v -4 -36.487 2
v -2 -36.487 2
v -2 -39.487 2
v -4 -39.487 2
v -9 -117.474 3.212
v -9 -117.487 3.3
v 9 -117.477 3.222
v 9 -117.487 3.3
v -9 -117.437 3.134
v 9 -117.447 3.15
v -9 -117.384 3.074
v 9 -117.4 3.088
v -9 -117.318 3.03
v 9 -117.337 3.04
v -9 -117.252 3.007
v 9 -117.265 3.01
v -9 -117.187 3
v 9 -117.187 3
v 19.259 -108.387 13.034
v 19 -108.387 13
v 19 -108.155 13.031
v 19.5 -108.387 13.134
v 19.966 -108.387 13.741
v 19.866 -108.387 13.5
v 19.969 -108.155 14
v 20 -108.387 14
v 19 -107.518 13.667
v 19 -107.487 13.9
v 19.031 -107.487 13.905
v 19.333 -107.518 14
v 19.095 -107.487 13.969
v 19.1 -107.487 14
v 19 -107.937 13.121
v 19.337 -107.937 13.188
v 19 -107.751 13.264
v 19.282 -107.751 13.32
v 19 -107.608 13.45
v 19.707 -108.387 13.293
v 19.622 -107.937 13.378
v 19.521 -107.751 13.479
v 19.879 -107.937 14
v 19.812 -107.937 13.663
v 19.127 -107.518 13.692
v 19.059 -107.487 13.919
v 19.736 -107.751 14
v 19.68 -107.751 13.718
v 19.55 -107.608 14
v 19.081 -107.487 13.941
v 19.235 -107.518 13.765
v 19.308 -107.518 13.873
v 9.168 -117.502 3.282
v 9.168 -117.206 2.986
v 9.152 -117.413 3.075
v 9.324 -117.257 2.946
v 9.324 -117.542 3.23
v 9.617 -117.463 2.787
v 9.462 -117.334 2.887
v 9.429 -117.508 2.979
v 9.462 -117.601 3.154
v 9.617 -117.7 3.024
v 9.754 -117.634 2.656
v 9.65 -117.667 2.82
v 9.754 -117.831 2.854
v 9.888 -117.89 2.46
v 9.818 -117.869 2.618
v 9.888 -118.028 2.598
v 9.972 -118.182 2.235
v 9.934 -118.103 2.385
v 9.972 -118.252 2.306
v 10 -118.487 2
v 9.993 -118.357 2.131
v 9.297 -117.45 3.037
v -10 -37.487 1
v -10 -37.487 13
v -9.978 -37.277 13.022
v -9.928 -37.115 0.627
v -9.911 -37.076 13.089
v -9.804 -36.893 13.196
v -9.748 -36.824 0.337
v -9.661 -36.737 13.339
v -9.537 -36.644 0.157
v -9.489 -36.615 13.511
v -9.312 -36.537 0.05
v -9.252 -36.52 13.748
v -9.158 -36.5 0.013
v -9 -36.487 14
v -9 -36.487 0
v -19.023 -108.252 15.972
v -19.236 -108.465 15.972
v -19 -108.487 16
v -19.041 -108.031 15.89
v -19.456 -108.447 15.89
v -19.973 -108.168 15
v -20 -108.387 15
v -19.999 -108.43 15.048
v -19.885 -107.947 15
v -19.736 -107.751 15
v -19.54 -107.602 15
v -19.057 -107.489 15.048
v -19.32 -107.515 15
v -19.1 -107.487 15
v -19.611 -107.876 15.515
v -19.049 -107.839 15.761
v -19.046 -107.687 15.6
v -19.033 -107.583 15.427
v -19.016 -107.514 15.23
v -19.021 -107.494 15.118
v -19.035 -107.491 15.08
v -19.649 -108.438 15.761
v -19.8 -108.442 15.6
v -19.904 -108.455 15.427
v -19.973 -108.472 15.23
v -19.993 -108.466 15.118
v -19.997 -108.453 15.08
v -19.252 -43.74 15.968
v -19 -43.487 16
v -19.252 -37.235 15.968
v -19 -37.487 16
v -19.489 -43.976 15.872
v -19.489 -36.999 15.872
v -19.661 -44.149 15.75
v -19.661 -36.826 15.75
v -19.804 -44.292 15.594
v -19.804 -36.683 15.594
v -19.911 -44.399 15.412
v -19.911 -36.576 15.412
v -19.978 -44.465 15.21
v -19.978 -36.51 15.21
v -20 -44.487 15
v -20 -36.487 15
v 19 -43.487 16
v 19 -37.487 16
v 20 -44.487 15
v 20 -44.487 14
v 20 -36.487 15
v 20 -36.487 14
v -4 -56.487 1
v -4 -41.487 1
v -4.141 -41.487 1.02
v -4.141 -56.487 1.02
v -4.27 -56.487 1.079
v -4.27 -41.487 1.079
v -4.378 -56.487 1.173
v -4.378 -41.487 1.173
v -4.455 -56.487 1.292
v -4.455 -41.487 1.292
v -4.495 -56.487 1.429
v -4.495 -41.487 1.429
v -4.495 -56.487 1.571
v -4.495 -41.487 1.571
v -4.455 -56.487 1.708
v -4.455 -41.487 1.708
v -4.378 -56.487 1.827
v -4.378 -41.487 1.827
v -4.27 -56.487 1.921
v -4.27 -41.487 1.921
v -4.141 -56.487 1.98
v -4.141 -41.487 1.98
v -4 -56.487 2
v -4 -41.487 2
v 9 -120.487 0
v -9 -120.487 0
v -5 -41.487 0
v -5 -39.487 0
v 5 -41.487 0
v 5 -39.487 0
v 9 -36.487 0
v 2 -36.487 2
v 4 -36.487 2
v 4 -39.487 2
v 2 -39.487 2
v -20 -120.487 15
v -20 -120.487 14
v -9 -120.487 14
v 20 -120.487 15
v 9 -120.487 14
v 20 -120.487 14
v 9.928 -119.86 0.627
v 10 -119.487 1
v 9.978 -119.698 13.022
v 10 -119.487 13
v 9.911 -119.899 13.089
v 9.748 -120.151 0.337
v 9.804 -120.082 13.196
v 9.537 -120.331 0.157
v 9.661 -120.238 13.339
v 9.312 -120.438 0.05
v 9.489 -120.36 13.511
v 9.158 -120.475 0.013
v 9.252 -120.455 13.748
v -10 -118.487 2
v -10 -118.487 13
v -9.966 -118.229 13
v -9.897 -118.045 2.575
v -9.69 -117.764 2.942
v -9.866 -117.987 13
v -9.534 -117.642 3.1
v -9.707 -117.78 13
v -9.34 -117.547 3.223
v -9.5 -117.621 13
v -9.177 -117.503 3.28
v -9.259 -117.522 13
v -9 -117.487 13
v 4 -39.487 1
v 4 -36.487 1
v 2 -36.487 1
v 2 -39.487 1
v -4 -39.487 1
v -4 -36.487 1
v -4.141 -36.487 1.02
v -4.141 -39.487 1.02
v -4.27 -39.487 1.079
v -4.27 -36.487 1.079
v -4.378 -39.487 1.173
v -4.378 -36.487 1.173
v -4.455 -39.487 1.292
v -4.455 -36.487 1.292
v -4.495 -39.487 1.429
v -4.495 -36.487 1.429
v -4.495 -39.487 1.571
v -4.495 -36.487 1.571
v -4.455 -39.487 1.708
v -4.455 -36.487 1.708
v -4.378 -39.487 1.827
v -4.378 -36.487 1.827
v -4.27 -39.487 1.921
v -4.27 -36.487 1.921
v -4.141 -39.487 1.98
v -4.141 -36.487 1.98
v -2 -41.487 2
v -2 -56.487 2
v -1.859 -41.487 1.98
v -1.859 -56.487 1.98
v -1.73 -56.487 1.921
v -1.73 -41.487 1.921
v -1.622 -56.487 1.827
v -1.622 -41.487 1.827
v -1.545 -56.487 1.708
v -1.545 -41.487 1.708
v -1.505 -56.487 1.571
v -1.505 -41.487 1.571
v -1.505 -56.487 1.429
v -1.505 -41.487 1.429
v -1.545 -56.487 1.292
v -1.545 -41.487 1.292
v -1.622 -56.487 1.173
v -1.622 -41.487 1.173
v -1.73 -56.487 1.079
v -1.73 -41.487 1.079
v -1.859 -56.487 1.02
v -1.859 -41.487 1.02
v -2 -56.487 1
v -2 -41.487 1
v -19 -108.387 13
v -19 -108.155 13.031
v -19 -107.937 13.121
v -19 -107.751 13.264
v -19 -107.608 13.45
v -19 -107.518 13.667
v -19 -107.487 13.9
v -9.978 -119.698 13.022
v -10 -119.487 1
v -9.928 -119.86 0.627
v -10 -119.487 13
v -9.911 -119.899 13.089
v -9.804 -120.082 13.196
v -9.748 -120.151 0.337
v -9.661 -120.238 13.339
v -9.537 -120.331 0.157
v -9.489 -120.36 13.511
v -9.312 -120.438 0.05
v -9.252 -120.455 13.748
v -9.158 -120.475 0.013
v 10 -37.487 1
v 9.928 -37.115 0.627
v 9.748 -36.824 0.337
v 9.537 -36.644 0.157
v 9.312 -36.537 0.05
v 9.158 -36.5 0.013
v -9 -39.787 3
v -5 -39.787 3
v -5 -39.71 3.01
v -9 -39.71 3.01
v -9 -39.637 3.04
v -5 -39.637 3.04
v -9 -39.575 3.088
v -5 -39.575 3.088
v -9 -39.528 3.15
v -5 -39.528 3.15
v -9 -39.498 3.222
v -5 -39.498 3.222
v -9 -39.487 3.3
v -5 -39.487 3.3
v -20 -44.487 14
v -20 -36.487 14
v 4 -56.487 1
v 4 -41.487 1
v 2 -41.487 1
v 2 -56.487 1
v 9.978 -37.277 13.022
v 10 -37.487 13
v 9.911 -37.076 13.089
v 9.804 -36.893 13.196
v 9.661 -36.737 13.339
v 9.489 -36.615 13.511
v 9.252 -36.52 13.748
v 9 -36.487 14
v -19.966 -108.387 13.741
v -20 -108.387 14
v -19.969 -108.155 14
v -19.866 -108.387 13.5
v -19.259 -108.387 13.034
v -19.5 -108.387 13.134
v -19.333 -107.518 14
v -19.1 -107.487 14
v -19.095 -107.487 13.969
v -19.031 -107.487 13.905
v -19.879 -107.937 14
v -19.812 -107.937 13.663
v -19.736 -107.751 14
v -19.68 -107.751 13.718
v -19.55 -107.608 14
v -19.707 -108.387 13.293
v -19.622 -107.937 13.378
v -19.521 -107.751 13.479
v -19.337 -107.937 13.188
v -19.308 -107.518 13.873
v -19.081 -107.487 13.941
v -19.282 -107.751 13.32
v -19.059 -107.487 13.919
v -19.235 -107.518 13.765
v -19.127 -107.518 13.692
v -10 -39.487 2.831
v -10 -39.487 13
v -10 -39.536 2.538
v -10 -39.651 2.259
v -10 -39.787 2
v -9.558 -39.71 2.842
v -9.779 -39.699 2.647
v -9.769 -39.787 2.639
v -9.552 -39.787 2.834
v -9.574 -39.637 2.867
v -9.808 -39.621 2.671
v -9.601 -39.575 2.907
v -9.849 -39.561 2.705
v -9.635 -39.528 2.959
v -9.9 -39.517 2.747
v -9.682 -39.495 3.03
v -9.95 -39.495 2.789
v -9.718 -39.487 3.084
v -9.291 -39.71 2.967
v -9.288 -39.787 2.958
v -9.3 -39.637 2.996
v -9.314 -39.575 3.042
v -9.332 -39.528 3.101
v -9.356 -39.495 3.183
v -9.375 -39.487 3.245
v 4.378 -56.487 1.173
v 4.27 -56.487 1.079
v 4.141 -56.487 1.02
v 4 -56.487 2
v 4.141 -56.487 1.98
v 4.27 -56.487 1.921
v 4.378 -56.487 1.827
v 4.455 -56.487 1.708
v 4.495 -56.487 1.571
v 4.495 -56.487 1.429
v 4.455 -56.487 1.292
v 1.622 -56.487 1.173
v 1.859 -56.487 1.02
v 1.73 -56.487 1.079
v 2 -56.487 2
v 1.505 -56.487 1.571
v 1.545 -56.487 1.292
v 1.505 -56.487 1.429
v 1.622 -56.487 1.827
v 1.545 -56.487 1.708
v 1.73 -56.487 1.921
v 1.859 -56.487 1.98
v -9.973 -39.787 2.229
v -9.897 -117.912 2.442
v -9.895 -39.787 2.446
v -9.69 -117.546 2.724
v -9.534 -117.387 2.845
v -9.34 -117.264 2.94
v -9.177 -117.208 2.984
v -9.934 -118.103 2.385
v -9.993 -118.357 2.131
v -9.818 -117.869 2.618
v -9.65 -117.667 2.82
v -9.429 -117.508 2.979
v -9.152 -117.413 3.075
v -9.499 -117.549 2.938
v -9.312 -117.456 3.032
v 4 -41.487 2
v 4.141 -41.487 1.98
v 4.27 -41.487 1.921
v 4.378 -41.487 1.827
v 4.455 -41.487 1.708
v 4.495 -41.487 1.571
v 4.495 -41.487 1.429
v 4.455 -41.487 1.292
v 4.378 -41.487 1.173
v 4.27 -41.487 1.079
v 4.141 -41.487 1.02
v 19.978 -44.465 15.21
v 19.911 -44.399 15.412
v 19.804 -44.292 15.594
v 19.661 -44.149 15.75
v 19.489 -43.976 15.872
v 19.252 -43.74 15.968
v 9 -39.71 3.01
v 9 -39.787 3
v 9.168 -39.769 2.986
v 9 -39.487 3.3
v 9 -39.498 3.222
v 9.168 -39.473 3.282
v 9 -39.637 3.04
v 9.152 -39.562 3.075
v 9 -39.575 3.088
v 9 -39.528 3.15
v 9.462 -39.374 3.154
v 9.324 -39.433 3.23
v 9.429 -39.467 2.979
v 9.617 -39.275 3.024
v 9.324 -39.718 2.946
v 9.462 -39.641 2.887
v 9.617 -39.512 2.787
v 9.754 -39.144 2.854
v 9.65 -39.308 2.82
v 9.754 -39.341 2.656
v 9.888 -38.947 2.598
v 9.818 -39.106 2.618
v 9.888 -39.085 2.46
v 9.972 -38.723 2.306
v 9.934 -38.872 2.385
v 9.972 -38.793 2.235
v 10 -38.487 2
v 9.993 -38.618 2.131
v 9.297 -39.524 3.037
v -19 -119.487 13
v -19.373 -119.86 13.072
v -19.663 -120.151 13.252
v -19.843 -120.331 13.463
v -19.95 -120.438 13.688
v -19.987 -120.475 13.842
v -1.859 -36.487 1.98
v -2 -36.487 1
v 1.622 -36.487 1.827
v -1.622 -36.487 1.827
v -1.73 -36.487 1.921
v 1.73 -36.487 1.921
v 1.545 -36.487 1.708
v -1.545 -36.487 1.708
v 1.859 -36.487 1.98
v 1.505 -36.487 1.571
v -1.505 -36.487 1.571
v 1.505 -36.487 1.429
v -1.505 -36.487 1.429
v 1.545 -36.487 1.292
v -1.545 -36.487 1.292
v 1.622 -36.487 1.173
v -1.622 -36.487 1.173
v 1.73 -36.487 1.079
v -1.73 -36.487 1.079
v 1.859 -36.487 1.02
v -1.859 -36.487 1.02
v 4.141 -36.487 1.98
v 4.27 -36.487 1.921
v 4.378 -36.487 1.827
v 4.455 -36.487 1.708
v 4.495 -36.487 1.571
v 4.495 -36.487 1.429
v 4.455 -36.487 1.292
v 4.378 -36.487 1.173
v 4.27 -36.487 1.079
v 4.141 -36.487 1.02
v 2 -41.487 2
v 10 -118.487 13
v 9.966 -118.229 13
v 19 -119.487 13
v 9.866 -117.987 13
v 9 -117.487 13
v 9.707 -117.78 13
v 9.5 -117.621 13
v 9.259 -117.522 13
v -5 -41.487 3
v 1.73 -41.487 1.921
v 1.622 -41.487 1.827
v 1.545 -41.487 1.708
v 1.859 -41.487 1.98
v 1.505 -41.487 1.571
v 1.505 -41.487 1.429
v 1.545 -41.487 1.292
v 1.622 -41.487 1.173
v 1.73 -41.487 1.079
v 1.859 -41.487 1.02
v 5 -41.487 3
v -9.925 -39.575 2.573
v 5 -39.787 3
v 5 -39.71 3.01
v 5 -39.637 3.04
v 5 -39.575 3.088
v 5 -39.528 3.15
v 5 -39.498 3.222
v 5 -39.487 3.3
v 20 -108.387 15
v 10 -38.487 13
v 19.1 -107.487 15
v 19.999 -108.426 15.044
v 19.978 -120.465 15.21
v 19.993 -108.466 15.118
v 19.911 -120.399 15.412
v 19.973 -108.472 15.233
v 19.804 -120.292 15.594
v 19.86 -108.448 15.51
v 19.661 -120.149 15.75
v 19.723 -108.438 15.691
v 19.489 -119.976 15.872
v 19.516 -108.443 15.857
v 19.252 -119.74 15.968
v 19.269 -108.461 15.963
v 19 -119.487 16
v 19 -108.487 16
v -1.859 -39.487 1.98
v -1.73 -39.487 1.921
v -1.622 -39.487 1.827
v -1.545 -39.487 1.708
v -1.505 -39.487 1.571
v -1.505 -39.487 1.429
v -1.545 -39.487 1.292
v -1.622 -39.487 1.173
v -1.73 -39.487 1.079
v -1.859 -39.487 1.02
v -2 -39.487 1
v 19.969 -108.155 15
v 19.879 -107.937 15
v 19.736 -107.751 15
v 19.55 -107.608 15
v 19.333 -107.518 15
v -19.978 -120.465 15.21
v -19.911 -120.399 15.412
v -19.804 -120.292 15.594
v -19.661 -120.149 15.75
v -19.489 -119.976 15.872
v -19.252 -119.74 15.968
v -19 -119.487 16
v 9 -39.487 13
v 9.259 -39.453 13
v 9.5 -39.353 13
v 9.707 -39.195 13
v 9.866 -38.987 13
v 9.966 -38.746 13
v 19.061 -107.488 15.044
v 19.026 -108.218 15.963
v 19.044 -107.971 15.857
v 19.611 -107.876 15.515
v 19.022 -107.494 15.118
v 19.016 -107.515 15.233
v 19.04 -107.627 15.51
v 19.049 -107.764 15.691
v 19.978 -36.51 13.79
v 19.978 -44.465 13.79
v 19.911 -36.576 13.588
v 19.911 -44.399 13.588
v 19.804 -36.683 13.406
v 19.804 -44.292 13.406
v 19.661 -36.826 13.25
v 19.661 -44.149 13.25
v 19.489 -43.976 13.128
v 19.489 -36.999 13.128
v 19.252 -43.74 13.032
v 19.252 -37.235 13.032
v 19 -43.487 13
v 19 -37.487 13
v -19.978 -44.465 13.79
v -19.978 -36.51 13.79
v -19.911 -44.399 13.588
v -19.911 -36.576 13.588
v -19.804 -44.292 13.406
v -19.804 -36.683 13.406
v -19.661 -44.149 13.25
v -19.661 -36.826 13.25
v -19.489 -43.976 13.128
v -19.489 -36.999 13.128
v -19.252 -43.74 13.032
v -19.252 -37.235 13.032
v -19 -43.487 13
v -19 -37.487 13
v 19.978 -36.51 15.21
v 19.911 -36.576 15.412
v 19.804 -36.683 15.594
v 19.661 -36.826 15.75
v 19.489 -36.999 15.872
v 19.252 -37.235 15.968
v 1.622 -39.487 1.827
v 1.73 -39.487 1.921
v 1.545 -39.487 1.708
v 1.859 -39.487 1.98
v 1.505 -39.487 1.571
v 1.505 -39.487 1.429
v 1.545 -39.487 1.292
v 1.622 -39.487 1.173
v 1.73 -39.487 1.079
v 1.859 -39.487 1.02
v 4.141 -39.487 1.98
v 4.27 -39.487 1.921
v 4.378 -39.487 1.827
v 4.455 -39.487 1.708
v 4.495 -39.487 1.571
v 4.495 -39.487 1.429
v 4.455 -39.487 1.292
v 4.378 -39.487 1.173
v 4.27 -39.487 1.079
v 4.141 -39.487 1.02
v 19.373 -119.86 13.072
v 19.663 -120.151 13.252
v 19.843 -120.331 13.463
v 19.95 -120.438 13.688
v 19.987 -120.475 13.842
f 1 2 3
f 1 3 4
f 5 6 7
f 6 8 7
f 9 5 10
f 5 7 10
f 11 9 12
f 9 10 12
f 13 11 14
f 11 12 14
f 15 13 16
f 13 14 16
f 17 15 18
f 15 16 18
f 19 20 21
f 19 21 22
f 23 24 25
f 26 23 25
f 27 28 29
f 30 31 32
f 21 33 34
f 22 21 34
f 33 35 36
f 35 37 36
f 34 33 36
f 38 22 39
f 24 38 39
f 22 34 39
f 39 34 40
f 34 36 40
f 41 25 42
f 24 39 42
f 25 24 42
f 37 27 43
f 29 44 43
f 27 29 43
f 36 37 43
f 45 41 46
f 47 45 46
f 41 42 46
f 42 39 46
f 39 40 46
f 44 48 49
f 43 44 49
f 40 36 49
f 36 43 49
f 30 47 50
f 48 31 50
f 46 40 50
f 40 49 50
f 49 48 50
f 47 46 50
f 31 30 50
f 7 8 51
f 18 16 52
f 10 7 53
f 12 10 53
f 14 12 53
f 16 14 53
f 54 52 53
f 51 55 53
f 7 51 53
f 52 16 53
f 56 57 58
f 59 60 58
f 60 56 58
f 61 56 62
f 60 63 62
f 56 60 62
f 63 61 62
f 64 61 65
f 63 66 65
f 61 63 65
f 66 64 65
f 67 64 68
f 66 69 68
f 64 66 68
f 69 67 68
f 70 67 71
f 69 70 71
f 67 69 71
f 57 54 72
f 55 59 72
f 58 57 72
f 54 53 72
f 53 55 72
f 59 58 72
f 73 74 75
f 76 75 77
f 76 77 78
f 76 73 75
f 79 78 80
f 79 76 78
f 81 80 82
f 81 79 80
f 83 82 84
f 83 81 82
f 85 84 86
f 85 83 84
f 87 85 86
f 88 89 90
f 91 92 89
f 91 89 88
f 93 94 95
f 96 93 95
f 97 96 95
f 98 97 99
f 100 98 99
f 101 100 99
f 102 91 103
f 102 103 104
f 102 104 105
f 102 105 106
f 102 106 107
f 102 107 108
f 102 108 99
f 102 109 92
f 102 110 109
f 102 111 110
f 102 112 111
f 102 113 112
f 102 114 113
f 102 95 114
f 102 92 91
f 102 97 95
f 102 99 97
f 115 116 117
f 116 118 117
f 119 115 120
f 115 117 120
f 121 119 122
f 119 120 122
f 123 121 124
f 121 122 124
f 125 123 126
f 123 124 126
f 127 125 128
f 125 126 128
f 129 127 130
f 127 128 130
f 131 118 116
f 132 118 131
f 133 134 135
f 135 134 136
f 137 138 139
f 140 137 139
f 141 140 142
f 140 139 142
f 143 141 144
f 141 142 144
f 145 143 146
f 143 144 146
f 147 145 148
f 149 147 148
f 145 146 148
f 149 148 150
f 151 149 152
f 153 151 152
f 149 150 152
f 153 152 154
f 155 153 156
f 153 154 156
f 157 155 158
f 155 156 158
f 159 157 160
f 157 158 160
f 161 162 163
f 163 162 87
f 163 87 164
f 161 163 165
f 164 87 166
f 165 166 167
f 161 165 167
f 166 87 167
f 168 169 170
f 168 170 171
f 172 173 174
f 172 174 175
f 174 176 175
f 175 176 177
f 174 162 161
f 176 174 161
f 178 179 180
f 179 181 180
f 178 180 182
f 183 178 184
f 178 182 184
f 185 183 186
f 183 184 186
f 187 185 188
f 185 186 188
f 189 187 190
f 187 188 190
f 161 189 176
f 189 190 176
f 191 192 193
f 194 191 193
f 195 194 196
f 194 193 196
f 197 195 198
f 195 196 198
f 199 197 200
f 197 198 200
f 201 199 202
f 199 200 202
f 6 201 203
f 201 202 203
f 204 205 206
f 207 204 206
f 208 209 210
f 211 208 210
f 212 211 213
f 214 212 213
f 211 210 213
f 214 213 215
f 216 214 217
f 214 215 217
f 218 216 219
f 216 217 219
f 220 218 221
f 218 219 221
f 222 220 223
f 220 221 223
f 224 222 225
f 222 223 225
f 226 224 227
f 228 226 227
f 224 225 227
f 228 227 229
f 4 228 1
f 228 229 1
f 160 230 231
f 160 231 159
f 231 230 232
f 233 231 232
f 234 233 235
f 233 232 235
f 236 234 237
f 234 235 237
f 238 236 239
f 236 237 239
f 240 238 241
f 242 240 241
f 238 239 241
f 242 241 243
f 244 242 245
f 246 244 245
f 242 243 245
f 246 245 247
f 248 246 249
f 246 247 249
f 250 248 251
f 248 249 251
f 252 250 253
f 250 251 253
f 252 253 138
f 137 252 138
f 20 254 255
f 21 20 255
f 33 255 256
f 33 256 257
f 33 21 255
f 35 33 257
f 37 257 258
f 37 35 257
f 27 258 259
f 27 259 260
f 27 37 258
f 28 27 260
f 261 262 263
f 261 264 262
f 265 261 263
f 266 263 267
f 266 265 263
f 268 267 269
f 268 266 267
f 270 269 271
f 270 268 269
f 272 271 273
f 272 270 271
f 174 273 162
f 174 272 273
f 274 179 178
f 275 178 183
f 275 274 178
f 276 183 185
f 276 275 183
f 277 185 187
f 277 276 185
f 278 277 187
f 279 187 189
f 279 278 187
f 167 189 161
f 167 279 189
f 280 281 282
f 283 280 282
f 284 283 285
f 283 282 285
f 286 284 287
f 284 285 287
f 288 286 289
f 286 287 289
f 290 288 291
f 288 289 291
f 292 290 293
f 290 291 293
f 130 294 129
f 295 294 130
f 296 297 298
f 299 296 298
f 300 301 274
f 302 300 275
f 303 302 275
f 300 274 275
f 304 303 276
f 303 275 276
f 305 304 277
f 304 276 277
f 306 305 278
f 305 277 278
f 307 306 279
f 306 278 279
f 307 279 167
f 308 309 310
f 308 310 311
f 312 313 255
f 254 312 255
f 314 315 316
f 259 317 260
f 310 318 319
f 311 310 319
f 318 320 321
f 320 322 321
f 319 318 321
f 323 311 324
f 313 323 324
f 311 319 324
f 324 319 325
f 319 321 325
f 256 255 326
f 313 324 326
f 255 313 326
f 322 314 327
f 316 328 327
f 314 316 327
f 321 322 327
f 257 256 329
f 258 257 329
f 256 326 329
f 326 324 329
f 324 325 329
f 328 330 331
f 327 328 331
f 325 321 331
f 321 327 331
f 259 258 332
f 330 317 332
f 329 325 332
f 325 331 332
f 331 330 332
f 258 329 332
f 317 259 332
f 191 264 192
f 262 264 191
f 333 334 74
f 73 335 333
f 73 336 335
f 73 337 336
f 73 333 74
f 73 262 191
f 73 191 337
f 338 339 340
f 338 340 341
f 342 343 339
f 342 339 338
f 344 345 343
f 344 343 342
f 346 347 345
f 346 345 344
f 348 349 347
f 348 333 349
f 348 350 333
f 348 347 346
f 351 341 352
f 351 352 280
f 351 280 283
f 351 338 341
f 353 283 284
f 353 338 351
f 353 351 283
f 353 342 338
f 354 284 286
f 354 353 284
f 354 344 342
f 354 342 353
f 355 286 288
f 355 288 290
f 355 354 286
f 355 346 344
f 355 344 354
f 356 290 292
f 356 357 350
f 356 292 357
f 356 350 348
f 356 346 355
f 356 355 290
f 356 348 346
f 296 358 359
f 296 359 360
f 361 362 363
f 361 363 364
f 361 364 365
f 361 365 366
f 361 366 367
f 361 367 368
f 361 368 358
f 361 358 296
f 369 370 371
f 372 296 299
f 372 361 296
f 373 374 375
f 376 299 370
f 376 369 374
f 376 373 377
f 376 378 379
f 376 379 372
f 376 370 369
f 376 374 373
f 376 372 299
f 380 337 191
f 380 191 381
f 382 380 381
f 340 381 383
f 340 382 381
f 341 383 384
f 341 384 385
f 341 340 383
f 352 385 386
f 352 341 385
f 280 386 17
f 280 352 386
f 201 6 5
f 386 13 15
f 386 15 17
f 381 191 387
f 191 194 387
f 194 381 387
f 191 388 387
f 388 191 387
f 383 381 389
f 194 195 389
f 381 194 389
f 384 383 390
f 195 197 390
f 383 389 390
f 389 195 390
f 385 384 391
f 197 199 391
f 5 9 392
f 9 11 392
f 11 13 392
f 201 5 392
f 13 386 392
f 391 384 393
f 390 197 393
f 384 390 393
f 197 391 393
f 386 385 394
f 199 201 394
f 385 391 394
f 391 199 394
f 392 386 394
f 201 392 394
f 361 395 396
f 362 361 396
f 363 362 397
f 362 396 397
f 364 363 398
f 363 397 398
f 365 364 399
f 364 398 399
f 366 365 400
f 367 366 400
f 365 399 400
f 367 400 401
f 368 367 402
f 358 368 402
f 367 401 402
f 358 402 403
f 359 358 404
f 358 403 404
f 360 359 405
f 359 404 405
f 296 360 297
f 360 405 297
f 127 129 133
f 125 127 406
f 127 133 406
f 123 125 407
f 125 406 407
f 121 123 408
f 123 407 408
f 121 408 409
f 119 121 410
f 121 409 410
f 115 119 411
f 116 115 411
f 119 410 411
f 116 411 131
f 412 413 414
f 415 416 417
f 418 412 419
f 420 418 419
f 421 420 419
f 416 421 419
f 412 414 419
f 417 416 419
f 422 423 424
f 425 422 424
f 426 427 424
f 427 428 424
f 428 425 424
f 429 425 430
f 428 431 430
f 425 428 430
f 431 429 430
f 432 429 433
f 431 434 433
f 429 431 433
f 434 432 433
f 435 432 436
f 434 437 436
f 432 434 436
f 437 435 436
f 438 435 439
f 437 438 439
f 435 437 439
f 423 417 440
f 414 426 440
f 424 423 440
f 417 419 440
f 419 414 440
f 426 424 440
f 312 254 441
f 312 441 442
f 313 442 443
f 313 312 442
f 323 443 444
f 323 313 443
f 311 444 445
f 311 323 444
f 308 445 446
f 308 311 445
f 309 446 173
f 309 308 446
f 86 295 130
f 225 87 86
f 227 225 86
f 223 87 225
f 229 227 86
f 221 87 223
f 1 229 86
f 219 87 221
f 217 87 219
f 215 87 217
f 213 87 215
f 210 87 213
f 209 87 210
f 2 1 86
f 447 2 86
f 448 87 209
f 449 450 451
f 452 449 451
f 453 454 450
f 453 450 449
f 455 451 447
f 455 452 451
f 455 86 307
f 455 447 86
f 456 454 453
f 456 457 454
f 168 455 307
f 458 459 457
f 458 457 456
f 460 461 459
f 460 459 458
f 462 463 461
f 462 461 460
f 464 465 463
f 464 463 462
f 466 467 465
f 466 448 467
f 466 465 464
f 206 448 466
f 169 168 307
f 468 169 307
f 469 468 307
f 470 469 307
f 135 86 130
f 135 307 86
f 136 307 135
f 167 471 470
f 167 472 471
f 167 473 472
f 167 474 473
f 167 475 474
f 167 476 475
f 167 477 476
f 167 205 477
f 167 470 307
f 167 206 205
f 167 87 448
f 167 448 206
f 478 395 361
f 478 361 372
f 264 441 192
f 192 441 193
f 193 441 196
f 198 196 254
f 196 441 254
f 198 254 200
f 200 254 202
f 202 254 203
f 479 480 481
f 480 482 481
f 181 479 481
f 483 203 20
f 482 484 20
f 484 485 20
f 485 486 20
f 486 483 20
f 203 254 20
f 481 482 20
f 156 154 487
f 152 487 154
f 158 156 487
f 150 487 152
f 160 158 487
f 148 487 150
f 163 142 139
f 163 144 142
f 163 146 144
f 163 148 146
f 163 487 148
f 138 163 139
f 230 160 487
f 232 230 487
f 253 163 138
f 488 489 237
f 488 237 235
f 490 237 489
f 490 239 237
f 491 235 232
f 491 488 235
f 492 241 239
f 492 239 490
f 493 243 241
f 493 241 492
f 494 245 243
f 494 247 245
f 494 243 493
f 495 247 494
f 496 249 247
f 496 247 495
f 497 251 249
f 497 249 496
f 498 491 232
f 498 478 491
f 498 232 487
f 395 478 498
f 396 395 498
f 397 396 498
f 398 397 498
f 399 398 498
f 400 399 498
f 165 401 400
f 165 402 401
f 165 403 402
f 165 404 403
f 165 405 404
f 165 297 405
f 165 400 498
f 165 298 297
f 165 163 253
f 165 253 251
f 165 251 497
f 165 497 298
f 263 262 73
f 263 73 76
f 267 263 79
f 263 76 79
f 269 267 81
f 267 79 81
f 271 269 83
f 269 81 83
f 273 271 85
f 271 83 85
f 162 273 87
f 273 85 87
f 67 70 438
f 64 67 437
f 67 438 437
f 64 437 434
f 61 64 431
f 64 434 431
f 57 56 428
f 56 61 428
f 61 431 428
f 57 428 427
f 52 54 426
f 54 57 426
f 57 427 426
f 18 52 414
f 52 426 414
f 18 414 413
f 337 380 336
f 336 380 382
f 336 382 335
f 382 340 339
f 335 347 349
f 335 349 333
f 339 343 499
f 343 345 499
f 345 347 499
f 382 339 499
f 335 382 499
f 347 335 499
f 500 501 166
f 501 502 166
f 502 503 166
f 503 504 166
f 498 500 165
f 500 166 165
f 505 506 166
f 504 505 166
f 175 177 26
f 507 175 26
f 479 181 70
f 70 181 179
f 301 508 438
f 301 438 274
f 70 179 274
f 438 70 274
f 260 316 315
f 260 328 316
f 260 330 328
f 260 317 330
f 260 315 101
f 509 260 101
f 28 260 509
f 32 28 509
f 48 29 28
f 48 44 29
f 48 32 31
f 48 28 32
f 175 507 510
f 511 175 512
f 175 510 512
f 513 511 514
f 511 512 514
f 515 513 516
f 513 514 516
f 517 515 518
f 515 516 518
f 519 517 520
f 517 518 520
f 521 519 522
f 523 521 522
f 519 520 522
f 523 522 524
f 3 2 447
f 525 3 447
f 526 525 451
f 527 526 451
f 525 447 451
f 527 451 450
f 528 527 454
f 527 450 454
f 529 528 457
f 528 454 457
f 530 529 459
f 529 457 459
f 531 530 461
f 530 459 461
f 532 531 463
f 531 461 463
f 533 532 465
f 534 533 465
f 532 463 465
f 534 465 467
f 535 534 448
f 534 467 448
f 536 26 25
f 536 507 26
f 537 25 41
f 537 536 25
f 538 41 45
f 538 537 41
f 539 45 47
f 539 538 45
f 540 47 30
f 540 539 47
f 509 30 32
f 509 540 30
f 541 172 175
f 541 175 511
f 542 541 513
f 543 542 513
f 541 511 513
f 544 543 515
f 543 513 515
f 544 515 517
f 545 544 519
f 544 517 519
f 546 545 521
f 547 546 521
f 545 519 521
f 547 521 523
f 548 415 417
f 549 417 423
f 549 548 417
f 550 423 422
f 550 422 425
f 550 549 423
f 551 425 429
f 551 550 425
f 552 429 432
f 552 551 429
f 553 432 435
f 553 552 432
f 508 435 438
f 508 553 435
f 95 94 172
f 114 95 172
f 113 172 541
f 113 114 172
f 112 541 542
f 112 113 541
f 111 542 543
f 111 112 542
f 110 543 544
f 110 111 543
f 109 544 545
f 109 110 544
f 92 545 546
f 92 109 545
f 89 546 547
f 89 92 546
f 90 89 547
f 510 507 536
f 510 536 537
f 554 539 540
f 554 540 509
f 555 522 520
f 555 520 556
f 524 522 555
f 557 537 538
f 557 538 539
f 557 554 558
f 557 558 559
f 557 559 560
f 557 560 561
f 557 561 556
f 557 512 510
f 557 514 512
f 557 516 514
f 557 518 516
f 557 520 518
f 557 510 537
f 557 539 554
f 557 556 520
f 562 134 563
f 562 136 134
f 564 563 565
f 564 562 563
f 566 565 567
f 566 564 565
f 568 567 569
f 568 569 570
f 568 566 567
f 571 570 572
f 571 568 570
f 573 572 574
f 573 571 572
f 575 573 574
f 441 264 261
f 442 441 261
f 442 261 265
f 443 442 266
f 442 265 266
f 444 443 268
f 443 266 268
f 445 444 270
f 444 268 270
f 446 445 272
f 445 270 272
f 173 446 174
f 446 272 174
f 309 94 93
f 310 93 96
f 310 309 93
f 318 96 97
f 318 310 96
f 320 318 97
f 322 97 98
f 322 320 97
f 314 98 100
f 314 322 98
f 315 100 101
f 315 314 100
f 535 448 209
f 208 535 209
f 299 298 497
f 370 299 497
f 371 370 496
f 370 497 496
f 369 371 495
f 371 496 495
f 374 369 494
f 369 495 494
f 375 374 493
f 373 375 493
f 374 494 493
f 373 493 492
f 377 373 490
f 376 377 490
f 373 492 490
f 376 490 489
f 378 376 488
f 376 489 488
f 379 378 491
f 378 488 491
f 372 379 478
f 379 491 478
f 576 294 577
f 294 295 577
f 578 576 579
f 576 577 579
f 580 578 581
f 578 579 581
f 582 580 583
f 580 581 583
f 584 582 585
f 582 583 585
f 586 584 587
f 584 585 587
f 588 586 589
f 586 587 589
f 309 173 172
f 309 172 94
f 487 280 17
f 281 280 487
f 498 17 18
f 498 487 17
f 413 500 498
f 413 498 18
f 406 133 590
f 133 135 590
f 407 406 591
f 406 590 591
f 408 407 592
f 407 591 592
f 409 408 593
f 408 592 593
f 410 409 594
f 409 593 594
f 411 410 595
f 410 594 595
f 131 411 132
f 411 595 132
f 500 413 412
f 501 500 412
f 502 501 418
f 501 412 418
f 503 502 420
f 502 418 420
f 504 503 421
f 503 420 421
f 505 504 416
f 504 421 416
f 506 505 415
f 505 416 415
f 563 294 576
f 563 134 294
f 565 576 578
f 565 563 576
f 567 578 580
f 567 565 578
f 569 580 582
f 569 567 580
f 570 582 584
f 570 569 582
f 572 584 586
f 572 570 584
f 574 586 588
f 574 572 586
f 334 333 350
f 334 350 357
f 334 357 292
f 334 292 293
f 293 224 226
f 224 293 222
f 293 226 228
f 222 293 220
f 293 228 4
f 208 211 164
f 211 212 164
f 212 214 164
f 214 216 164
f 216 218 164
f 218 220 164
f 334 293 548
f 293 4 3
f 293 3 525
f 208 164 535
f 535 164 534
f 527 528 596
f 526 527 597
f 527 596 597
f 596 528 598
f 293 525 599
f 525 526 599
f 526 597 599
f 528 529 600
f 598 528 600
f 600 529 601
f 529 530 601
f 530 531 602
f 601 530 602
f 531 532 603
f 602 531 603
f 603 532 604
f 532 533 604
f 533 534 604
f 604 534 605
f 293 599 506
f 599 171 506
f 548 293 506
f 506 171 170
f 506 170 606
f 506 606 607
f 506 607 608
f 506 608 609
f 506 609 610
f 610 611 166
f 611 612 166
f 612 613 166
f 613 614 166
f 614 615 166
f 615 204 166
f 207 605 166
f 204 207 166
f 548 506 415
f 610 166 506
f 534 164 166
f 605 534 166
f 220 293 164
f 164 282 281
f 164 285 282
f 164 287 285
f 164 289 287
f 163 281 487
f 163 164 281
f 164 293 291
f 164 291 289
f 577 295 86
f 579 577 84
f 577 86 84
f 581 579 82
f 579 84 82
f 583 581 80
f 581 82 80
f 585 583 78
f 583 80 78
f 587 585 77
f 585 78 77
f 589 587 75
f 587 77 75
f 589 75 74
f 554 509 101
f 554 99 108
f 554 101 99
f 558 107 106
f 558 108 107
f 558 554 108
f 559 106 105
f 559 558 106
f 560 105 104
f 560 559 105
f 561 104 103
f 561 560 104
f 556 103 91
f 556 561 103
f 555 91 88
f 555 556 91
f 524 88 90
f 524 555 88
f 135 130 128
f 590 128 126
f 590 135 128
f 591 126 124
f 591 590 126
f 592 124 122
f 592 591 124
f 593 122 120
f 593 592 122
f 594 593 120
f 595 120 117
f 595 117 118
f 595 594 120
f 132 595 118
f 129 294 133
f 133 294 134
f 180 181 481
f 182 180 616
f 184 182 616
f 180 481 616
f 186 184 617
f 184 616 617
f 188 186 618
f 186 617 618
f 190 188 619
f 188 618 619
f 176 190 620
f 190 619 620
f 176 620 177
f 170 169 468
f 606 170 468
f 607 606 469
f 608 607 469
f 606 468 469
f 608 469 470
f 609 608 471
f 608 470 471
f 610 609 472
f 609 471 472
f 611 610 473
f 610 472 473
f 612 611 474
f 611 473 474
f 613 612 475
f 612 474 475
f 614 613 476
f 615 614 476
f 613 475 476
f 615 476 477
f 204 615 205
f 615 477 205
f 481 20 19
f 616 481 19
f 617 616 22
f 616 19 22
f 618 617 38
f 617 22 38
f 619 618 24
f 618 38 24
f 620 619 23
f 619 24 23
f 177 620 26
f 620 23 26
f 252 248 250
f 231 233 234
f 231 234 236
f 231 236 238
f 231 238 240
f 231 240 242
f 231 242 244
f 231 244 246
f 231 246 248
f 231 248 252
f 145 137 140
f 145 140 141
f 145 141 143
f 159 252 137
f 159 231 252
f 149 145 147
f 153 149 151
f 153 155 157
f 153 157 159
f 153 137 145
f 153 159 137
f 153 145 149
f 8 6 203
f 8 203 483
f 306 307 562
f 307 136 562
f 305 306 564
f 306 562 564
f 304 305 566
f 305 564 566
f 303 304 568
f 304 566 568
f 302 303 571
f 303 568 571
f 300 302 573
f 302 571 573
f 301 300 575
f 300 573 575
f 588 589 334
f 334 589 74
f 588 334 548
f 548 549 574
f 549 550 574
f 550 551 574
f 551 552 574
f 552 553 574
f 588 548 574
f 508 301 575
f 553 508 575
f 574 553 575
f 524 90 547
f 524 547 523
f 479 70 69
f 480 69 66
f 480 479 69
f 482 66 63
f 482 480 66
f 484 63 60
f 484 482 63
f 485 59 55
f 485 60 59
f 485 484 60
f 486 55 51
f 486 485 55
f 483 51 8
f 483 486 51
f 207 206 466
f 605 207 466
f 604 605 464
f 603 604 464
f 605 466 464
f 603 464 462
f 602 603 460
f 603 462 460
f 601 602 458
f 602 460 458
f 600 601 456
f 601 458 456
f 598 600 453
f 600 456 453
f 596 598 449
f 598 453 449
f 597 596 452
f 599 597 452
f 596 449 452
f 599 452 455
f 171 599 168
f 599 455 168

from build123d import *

# Parameters (mm, degrees)
SKETCH001_W     = 20
SKETCH001_H     = 84
PAD001_DEPTH    = 3
SKETCH002_W     = 20
SKETCH002_H     = 3
PAD002_DEPTH    = 10
SKETCH003_W     = 40
SKETCH003_H     = 8
SKETCH003_H_2   = 13
PAD003_DEPTH    = 3
FILLET_R        = 1
FILLET001_R     = 1
FILLET002_R     = 1
FILLET003_R     = 0.3
FILLET004_R     = 0.9
SKETCH009_W     = 10
SKETCH009_H     = 2
POCKET004_DEPTH = 5
POCKET005_DEPTH = 20


with BuildPart() as part:
    # Sketch001 → Pad001 (new body)
    with BuildSketch(Plane.XY):
        with Locations((0, -78.487457)):
            Rectangle(SKETCH001_W, SKETCH001_H)
    extrude(amount=PAD001_DEPTH)

    # Sketch002 → Pad002 (new body)
    with BuildSketch(Plane.XY.offset(3)):
        with Locations((0, -118.987457)):
            Rectangle(SKETCH002_W, SKETCH002_H)
        with Locations((0, -37.987457)):
            Rectangle(SKETCH002_W, SKETCH002_H)
    extrude(amount=PAD002_DEPTH)

    # Sketch003 → Pad003 (new body)
    with BuildSketch(Plane.XY.offset(13)):
        with Locations((0, -40.487457)):
            Rectangle(SKETCH003_W, SKETCH003_H)
        with Locations((0, -113.987457)):
            Rectangle(SKETCH003_W, SKETCH003_H_2)
    extrude(amount=PAD003_DEPTH)

    # Fillet
    fillet_edges = [part.edges().sort_by_distance(p)[0] for p in [
        (20, -113.987457, 16),
        (20, -113.987457, 13),
        (-20, -113.987457, 16),
        (0, -107.487457, 16),
        (0, -120.487457, 16),
        (-20, -113.987457, 13),
        (-15, -120.487457, 13),
        (15, -120.487457, 13),
    ]]
    fillet(fillet_edges, radius=FILLET_R)

    # Fillet001
    fillet001_edges = [part.edges().sort_by_distance(p)[0] for p in [
        (20, -40.487457, 16),
        (0, -44.487457, 16),
        (0, -36.487457, 16),
        (-20, -40.487457, 16),
        (-20, -40.487457, 13),
        (-15, -36.487457, 13),
        (15, -36.487457, 13),
        (20, -40.487457, 13),
        (0, -44.487457, 13),
    ]]
    fillet(fillet001_edges, radius=FILLET001_R)

    # Fillet002
    fillet002_edges = [part.edges().sort_by_distance(p)[0] for p in [
        (-10, -78.487457, 3),
        (-10, -117.487457, 8),
        (-10, -120.487457, 6.5),
        (-10, -78.487457, 0),
        (-10, -36.487457, 6.5),
        (10, -39.487457, 8),
        (10, -36.487457, 6.5),
        (10, -78.487457, 0),
        (10, -78.487457, 3),
        (10, -117.487457, 8),
        (10, -120.487457, 6.5),
    ]]
    fillet(fillet002_edges, radius=FILLET002_R)

    # Fillet003
    fillet003_edges = [part.edges().sort_by_distance(p)[0] for p in [
        (0, -39.487457, 3),
        (0, -117.487457, 3),
    ]]
    fillet(fillet003_edges, radius=FILLET003_R)

    # Fillet004
    fillet004_edges = [part.edges().sort_by_distance(p)[0] for p in [
        (0, -107.487457, 13),
    ]]
    fillet(fillet004_edges, radius=FILLET004_R)

    # Sketch009 → Pocket004 (cut)
    with BuildSketch(Plane(origin=(0, 0, 0), x_dir=(1, 0, 0), z_dir=(0, 0, -1))):
        with Locations((0, 40.487457)):
            Rectangle(SKETCH009_W, SKETCH009_H)
    extrude(amount=-POCKET004_DEPTH, mode=Mode.SUBTRACT)

    # Sketch012 → Pocket005 (cut)
    with BuildSketch(Plane(origin=(0, -36.487457, 0), x_dir=(-1, 0, 0), z_dir=(0, 1, 0))):
        with BuildLine():
            ThreePointArc((-4, 2), (-4.5, 1.5), (-4, 1))
            Line((-4, 1), (-2, 1))
            ThreePointArc((-2, 1), (-1.5, 1.5), (-2, 2))
            Line((-4, 2), (-2, 2))
        make_face()
        with BuildLine():
            ThreePointArc((2, 2), (1.5, 1.5), (2, 1))
            Line((2, 1), (4, 1))
            ThreePointArc((4, 1), (4.5, 1.5), (4, 2))
            Line((2, 2), (4, 2))
        make_face()
    extrude(amount=-POCKET005_DEPTH, mode=Mode.SUBTRACT)


solid = part.part
